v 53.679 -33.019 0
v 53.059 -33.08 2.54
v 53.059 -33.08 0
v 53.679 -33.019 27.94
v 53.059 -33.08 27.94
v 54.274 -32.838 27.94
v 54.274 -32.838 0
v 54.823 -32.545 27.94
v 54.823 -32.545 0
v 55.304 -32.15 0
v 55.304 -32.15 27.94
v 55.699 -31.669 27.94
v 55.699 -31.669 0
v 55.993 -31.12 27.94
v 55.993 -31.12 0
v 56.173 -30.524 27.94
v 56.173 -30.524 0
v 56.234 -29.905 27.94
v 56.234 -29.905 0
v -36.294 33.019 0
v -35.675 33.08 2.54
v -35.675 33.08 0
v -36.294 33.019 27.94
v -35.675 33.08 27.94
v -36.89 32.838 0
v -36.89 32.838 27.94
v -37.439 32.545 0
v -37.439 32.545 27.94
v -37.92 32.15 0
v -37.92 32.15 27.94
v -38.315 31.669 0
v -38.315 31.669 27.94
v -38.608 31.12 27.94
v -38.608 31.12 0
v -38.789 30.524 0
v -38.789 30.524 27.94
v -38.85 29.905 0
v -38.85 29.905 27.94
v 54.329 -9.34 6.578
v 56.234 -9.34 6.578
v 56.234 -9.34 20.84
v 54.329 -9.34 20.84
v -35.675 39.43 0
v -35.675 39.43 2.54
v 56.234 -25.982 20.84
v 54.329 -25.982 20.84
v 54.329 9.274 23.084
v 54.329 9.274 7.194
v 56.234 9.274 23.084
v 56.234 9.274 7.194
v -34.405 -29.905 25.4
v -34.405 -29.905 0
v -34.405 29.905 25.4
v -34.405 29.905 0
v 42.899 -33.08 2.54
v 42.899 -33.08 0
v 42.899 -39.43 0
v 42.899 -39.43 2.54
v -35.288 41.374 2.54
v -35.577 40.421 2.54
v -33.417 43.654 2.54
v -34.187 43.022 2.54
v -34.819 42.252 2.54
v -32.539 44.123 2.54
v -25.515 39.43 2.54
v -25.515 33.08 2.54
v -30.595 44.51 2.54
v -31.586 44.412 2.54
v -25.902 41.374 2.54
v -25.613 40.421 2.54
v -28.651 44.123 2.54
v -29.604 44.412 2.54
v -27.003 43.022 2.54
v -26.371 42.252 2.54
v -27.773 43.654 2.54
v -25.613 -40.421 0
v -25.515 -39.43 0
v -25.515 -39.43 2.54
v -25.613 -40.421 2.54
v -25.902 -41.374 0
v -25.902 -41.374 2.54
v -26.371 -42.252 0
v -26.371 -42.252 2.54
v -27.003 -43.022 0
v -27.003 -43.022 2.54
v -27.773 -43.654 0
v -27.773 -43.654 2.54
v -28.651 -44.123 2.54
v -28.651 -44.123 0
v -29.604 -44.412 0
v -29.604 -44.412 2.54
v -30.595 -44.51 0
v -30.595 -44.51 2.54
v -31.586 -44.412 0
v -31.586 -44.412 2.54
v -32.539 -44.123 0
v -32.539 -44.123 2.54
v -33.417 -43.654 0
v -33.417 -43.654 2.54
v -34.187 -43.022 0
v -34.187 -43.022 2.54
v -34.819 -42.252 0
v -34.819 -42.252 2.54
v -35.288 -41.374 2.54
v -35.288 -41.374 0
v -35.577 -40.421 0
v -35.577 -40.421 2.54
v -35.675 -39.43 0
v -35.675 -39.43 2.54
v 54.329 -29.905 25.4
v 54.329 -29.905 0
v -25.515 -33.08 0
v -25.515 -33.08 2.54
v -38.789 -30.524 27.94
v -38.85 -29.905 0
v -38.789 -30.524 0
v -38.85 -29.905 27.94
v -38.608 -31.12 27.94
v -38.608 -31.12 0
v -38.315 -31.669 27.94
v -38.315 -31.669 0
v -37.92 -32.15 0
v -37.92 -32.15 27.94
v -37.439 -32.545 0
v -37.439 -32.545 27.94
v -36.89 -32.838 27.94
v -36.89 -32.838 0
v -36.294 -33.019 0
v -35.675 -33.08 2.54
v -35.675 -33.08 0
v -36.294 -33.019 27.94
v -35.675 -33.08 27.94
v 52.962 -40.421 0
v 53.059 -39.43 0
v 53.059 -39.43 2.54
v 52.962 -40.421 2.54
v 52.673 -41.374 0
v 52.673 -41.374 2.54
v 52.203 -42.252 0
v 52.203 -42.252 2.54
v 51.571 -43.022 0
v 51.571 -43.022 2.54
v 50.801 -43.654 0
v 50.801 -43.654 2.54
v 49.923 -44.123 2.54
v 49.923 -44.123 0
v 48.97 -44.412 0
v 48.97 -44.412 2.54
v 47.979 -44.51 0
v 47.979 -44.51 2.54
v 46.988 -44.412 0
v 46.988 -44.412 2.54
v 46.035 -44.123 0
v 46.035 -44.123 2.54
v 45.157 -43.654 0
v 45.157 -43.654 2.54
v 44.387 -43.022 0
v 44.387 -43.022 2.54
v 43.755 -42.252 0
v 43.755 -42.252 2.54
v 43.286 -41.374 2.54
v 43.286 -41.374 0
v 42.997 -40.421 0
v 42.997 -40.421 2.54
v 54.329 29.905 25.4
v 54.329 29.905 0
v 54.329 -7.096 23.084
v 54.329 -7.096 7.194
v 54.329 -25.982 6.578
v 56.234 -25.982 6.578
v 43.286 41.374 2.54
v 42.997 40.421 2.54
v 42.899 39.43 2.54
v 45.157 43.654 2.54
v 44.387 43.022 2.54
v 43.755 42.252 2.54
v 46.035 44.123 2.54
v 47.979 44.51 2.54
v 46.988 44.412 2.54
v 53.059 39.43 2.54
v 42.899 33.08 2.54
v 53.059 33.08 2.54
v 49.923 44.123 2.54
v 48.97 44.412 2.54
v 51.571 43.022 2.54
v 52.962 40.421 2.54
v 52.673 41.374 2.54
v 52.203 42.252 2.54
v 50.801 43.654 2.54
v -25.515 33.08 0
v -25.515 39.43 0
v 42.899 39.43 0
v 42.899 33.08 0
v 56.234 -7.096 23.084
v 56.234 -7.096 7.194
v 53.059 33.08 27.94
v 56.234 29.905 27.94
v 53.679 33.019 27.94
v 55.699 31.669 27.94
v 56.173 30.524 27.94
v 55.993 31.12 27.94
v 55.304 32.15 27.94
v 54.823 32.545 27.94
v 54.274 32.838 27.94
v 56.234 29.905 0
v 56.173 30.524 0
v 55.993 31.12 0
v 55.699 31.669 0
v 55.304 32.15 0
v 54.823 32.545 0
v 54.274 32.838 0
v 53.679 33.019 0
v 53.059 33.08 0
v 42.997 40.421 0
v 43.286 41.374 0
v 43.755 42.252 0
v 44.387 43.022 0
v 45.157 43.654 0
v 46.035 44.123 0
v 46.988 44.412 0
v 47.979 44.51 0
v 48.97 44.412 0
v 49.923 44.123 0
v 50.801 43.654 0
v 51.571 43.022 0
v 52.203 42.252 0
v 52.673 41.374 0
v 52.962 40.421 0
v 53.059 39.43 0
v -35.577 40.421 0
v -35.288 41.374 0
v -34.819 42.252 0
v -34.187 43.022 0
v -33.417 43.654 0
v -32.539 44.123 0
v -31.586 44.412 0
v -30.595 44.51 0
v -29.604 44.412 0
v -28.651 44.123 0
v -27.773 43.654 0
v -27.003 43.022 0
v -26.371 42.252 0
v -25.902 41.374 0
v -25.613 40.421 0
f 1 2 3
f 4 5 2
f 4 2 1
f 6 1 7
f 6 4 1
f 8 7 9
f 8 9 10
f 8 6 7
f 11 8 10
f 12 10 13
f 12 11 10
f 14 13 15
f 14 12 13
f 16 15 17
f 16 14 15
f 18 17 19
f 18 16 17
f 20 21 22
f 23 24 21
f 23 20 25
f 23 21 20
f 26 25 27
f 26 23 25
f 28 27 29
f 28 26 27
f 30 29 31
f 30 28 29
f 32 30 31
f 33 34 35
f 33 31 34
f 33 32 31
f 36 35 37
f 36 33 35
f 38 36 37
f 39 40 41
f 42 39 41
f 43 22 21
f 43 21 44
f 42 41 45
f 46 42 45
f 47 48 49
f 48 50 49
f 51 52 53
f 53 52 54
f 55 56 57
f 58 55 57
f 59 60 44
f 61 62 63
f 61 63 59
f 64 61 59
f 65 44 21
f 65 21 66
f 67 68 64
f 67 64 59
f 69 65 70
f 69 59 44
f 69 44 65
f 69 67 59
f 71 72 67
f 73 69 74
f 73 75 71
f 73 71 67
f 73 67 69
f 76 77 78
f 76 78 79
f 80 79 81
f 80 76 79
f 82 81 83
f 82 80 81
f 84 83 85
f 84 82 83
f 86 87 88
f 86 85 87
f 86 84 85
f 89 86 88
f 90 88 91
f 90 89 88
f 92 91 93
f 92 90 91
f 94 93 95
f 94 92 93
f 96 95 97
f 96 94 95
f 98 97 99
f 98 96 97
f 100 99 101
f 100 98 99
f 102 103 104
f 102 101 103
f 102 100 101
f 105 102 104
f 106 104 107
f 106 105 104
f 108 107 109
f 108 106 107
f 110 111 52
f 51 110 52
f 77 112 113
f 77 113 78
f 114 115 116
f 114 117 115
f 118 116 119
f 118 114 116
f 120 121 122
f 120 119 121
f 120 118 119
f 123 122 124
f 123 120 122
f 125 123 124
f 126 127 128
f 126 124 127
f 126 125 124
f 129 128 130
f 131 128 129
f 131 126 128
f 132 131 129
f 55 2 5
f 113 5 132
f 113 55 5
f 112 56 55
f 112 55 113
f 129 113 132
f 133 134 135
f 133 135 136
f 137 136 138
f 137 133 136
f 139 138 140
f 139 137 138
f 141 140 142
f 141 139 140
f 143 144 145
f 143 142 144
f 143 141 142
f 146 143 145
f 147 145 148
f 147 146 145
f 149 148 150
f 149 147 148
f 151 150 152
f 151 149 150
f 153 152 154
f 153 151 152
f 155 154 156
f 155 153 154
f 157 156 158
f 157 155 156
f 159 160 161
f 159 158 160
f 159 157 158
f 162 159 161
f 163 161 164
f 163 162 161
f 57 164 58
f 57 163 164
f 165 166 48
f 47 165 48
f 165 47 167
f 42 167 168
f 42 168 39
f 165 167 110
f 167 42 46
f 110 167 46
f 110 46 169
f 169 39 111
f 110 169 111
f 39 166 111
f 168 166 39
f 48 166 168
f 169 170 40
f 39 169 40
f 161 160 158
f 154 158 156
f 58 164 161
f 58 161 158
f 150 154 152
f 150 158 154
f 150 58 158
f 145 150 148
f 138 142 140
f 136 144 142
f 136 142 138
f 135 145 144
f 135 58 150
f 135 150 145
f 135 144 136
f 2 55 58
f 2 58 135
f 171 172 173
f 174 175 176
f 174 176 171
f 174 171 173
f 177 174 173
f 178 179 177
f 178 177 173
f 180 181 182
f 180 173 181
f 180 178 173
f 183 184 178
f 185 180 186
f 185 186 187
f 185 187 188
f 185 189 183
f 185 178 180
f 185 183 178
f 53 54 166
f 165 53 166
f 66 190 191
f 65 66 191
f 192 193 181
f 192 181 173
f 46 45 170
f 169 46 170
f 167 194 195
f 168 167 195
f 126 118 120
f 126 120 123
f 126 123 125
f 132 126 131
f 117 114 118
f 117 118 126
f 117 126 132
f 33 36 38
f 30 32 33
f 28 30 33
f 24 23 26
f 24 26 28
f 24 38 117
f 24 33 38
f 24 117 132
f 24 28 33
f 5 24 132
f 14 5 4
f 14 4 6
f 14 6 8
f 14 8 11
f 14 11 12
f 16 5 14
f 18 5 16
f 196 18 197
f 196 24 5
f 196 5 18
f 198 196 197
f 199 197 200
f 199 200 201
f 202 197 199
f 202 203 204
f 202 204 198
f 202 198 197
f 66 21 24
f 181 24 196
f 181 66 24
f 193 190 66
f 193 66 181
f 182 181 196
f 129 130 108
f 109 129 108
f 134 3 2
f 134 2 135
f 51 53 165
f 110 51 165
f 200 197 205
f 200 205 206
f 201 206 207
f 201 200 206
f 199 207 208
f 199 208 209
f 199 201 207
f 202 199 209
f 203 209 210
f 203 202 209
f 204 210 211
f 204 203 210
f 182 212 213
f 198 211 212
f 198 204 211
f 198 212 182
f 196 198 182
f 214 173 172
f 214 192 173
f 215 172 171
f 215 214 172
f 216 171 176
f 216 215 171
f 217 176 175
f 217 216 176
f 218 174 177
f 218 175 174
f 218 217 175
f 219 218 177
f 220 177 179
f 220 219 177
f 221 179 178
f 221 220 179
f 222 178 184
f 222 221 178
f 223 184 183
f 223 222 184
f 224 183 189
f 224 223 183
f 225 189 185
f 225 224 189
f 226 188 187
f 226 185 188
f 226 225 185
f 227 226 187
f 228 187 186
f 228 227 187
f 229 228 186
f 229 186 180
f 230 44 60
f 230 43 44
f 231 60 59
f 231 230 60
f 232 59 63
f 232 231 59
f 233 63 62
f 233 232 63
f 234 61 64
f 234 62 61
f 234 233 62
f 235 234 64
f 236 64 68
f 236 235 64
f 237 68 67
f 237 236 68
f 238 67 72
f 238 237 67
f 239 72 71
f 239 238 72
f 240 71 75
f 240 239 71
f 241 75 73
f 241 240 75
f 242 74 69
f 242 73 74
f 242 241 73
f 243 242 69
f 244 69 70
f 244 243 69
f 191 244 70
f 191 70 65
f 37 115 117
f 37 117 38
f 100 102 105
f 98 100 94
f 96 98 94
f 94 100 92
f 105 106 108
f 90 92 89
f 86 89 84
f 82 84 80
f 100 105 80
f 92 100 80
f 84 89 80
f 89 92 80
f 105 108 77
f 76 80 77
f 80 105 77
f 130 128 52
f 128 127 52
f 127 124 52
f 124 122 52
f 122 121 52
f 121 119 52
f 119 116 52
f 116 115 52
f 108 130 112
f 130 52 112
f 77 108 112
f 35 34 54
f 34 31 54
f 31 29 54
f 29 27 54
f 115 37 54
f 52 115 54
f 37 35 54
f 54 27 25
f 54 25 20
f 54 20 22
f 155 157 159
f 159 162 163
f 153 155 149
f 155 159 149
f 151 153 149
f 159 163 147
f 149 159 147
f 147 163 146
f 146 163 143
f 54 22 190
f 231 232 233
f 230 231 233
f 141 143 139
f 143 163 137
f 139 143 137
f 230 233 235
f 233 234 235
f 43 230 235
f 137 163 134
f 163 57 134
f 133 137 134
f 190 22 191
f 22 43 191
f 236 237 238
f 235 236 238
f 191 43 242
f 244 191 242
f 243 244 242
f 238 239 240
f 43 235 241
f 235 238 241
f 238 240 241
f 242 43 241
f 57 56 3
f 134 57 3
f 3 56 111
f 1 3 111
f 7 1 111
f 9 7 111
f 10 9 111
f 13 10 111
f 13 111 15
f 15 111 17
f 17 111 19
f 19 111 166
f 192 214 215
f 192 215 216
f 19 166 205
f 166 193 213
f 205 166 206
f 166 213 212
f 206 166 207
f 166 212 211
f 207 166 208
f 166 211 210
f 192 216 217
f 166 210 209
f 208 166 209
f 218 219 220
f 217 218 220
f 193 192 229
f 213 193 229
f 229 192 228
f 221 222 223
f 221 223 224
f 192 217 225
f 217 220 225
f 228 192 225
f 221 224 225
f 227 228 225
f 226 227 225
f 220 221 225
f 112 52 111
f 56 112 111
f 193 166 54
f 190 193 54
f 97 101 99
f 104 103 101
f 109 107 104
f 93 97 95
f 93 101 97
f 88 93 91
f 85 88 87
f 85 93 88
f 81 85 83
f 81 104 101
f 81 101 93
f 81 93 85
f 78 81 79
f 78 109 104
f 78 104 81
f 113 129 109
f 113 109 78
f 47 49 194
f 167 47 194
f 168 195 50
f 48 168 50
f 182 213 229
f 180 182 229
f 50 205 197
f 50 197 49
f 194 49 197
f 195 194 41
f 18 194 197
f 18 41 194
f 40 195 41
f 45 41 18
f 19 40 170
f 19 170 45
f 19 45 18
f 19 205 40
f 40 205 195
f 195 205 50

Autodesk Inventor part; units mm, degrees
ref_plane "YZ Plane" through (0, 0, 0) normal (1, 0, 0) x (0, 1, 0)
ref_plane "XZ Plane" through (0, 0, 0) normal (0, 1, 0) x (-1, 0, 0)
ref_plane "XY Plane" through (0, 0, 0) normal (0, 0, 1) x (1, 0, 0)
ref_plane "Work Plane1" through (0, 0, 0) normal (0, 0, 1) x (1, 0, 0)
sketch "Sketch1" plane through (0, 0, 0) normal (0, 0, 1) x (1, 0, 0)
  line L0 (56.2342, -33.08) -> (-38.85, -33.08)
  line L1 (-38.85, -33.08) -> (-38.85, 33.08)
  line L2 (-38.85, 33.08) -> (56.2342, 33.08)
  line L3 (56.2342, 33.08) -> (56.2342, -33.08)
  line L4 (-32.5, 25) -> (-32.5, -25) projected
  line L5 (49.4242, -28) -> (-29.5, -28) projected
  line L6 (52.4242, 25) -> (52.4242, -25) projected
  line L7 (49.4242, 28) -> (-29.5, 28) projected
  line L8 (-34.405, 29.905) -> (54.3292, 29.905) projected
  line L9 (54.3292, 29.905) -> (54.3292, -29.905) projected
  line L10 (54.3292, -29.905) -> (-34.405, -29.905) projected
  line L11 (-34.405, -29.905) -> (-34.405, 29.905) projected
  line L12 (-36.31, 30.54) -> (53.6942, 30.54)
  line L13 (53.6942, 30.54) -> (53.6942, -30.54)
  line L14 (53.6942, -30.54) -> (-36.31, -30.54)
  line L15 (-36.31, -30.54) -> (-36.31, 30.54)
  point P0 (0, 0)
  dimension "d18" = 2.54
  dimension "d19" = 2.54
  dimension "d20" = 2.54
  dimension "d27" = 0.635
  dimension "d28" = 2.54
  dimension "d30" = 3.81
  dimension "d31" = 3.81
  dimension "d33" = 2.54
extrude "Extrusion1" add sketch "Sketch1" along normal blind 25.4 contours L0 L1 L2 L3 | L11 L10 L13 L14 L15 L12 L8
fillet "Fillet1" radius 3.175 4 edges at (-38.85, 33.08, 12.7) (-38.85, -33.08, 12.7) (56.2342, -33.08, 12.7) (56.2342, 33.08, 12.7)
sketch "Sketch3" plane through (56.2342, -29.905, 0) normal (1, 0, 0) x (0, 0, -1)
  line L0 (-20.459, 4.3043) -> (-20.459, 20.1843) projected
  line L1 (-6.959, 4.3043) -> (-20.459, 4.3043) projected
  line L2 (-6.959, 20.1843) -> (-20.459, 20.1843) projected
  line L3 (-6.959, 4.3043) -> (-6.959, 20.1843) projected
  line L4 (-22.449, 27.9943) -> (-22.449, 33.9943) projected
  line L5 (-13.7386, 23.4443) -> (-16.7386, 23.4443) projected
  line L6 (-16.7386, 38.5443) -> (-13.7386, 38.5443) projected
  line L7 (-16.7386, 38.5443) -> (-13.7386, 38.5443) projected
  line L8 (-7.829, 30.9743) -> (-7.829, 27.9943) projected
  line L9 (-23.084, 22.8093) -> (-7.194, 22.8093)
  line L10 (-7.194, 22.8093) -> (-7.194, 39.1793)
  line L11 (-7.194, 39.1793) -> (-23.084, 39.1793)
  line L12 (-23.084, 39.1793) -> (-23.084, 22.8093)
  line L13 (-20.84, 3.9233) -> (-6.578, 3.9233)
  line L14 (-6.578, 3.9233) -> (-6.578, 20.5653)
  line L15 (-6.578, 20.5653) -> (-20.84, 20.5653)
  line L16 (-20.84, 20.5653) -> (-20.84, 3.9233)
  point P0 (0, 29.905)
  dimension "d9" = 0.635
  dimension "d10" = 0.635
  dimension "d11" = 0.635
  dimension "d12" = 0.635
  dimension "d13" = 0.381
  dimension "d14" = 0.381
  dimension "d15" = 0.381
  dimension "d16" = 0.381
extrude "Extrusion2" cut sketch "Sketch3" against normal up to surface (1.905 mm away) contours L0 L2 L3 L1 | L12 L11 L10 L9 | L16 L15 L14 L13
sketch "Sketch4" plane through (0, 0, 25.4) normal (0, 0, 1) x (1, 0, 0)
  line L0 (-38.85, 29.905) -> (-38.85, -29.905) projected
  arc A0 (56.2342, 29.905) -> (53.0592, 33.08) centre (53.0592, 29.905) ccw projected
  line L1 (53.0592, 33.08) -> (-35.675, 33.08) projected
  arc A1 (-35.675, 33.08) -> (-38.85, 29.905) centre (-35.675, 29.905) ccw projected
  line L2 (-38.85, 29.905) -> (-38.85, -29.905) projected
  arc A2 (-38.85, -29.905) -> (-35.675, -33.08) centre (-35.675, -29.905) ccw projected
  line L3 (-35.675, -33.08) -> (53.0592, -33.08) projected
  arc A3 (53.0592, -33.08) -> (56.2342, -29.905) centre (53.0592, -29.905) ccw projected
  line L4 (56.2342, -29.905) -> (56.2342, 29.905) projected
  line L5 (-34.405, 29.905) -> (54.3292, 29.905) projected
  line L6 (54.3292, 29.905) -> (54.3292, -29.905) projected
  line L7 (54.3292, -29.905) -> (-34.405, -29.905) projected
  line L8 (-34.405, -29.905) -> (-34.405, 29.905) projected
  point P0 (0, 0)
extrude "Extrusion3" add sketch "Sketch4" along normal blind 2.54 contours A1 L1 A0 L4 A3 L3 A2 L0 | L5 L6 L7 L8
ref_plane "Work Plane2" through (0, 0, 0) normal (0, 0, 1) x (1, 0, 0)
sketch "Sketch5" plane through (0, 0, 0) normal (0, 0, 1) x (1, 0, 0)
  line L0 (53.0592, 33.08) -> (-35.675, 33.08) projected
  line L1 (-35.675, 33.08) -> (-35.675, 39.43)
  line L2 (-25.515, 33.08) -> (-25.515, 39.43)
  arc A0 (-25.515, 39.43) -> (-35.675, 39.43) centre (-30.595, 39.43) ccw
  line L3 (-35.675, 33.08) -> (-25.515, 33.08)
  line L4 (8.6921, 33.08) -> (8.6921, -33.08)
  line L5 (-35.675, -33.08) -> (53.0592, -33.08) projected
  line L6 (-38.85, 29.905) -> (-38.85, -29.905) projected
  line L7 (-38.85, 0) -> (57.3991, 0)
  line L8 (53.0592, 33.08) -> (53.0592, 39.43)
  line L9 (42.8992, 33.08) -> (42.8992, 39.43)
  arc A1 (53.0592, 39.43) -> (42.8992, 39.43) centre (47.9792, 39.43) ccw
  line L10 (53.0592, 33.08) -> (42.8992, 33.08)
  line L11 (53.0592, -33.08) -> (-35.675, -33.08)
  line L12 (-35.675, -33.08) -> (-35.675, -39.43)
  line L13 (-25.515, -33.08) -> (-25.515, -39.43)
  arc A2 (-35.675, -39.43) -> (-25.515, -39.43) centre (-30.595, -39.43) ccw
  line L14 (-35.675, -33.08) -> (-25.515, -33.08)
  line L15 (42.8992, -33.08) -> (42.8992, -39.43)
  line L16 (53.0592, -33.08) -> (53.0592, -39.43)
  arc A3 (42.8992, -39.43) -> (53.0592, -39.43) centre (47.9792, -39.43) ccw
  point P0 (0, 0)
  point P1 (42.8992, 33.08)
  point P2 (42.8992, -33.08)
  point P3 (-25.515, -33.08)
  dimension "d34" = 6.35
  dimension "d35" = 10.16
extrude "Extrusion4" add sketch "Sketch5" along normal blind 2.54
properties part number "RPi Case"
